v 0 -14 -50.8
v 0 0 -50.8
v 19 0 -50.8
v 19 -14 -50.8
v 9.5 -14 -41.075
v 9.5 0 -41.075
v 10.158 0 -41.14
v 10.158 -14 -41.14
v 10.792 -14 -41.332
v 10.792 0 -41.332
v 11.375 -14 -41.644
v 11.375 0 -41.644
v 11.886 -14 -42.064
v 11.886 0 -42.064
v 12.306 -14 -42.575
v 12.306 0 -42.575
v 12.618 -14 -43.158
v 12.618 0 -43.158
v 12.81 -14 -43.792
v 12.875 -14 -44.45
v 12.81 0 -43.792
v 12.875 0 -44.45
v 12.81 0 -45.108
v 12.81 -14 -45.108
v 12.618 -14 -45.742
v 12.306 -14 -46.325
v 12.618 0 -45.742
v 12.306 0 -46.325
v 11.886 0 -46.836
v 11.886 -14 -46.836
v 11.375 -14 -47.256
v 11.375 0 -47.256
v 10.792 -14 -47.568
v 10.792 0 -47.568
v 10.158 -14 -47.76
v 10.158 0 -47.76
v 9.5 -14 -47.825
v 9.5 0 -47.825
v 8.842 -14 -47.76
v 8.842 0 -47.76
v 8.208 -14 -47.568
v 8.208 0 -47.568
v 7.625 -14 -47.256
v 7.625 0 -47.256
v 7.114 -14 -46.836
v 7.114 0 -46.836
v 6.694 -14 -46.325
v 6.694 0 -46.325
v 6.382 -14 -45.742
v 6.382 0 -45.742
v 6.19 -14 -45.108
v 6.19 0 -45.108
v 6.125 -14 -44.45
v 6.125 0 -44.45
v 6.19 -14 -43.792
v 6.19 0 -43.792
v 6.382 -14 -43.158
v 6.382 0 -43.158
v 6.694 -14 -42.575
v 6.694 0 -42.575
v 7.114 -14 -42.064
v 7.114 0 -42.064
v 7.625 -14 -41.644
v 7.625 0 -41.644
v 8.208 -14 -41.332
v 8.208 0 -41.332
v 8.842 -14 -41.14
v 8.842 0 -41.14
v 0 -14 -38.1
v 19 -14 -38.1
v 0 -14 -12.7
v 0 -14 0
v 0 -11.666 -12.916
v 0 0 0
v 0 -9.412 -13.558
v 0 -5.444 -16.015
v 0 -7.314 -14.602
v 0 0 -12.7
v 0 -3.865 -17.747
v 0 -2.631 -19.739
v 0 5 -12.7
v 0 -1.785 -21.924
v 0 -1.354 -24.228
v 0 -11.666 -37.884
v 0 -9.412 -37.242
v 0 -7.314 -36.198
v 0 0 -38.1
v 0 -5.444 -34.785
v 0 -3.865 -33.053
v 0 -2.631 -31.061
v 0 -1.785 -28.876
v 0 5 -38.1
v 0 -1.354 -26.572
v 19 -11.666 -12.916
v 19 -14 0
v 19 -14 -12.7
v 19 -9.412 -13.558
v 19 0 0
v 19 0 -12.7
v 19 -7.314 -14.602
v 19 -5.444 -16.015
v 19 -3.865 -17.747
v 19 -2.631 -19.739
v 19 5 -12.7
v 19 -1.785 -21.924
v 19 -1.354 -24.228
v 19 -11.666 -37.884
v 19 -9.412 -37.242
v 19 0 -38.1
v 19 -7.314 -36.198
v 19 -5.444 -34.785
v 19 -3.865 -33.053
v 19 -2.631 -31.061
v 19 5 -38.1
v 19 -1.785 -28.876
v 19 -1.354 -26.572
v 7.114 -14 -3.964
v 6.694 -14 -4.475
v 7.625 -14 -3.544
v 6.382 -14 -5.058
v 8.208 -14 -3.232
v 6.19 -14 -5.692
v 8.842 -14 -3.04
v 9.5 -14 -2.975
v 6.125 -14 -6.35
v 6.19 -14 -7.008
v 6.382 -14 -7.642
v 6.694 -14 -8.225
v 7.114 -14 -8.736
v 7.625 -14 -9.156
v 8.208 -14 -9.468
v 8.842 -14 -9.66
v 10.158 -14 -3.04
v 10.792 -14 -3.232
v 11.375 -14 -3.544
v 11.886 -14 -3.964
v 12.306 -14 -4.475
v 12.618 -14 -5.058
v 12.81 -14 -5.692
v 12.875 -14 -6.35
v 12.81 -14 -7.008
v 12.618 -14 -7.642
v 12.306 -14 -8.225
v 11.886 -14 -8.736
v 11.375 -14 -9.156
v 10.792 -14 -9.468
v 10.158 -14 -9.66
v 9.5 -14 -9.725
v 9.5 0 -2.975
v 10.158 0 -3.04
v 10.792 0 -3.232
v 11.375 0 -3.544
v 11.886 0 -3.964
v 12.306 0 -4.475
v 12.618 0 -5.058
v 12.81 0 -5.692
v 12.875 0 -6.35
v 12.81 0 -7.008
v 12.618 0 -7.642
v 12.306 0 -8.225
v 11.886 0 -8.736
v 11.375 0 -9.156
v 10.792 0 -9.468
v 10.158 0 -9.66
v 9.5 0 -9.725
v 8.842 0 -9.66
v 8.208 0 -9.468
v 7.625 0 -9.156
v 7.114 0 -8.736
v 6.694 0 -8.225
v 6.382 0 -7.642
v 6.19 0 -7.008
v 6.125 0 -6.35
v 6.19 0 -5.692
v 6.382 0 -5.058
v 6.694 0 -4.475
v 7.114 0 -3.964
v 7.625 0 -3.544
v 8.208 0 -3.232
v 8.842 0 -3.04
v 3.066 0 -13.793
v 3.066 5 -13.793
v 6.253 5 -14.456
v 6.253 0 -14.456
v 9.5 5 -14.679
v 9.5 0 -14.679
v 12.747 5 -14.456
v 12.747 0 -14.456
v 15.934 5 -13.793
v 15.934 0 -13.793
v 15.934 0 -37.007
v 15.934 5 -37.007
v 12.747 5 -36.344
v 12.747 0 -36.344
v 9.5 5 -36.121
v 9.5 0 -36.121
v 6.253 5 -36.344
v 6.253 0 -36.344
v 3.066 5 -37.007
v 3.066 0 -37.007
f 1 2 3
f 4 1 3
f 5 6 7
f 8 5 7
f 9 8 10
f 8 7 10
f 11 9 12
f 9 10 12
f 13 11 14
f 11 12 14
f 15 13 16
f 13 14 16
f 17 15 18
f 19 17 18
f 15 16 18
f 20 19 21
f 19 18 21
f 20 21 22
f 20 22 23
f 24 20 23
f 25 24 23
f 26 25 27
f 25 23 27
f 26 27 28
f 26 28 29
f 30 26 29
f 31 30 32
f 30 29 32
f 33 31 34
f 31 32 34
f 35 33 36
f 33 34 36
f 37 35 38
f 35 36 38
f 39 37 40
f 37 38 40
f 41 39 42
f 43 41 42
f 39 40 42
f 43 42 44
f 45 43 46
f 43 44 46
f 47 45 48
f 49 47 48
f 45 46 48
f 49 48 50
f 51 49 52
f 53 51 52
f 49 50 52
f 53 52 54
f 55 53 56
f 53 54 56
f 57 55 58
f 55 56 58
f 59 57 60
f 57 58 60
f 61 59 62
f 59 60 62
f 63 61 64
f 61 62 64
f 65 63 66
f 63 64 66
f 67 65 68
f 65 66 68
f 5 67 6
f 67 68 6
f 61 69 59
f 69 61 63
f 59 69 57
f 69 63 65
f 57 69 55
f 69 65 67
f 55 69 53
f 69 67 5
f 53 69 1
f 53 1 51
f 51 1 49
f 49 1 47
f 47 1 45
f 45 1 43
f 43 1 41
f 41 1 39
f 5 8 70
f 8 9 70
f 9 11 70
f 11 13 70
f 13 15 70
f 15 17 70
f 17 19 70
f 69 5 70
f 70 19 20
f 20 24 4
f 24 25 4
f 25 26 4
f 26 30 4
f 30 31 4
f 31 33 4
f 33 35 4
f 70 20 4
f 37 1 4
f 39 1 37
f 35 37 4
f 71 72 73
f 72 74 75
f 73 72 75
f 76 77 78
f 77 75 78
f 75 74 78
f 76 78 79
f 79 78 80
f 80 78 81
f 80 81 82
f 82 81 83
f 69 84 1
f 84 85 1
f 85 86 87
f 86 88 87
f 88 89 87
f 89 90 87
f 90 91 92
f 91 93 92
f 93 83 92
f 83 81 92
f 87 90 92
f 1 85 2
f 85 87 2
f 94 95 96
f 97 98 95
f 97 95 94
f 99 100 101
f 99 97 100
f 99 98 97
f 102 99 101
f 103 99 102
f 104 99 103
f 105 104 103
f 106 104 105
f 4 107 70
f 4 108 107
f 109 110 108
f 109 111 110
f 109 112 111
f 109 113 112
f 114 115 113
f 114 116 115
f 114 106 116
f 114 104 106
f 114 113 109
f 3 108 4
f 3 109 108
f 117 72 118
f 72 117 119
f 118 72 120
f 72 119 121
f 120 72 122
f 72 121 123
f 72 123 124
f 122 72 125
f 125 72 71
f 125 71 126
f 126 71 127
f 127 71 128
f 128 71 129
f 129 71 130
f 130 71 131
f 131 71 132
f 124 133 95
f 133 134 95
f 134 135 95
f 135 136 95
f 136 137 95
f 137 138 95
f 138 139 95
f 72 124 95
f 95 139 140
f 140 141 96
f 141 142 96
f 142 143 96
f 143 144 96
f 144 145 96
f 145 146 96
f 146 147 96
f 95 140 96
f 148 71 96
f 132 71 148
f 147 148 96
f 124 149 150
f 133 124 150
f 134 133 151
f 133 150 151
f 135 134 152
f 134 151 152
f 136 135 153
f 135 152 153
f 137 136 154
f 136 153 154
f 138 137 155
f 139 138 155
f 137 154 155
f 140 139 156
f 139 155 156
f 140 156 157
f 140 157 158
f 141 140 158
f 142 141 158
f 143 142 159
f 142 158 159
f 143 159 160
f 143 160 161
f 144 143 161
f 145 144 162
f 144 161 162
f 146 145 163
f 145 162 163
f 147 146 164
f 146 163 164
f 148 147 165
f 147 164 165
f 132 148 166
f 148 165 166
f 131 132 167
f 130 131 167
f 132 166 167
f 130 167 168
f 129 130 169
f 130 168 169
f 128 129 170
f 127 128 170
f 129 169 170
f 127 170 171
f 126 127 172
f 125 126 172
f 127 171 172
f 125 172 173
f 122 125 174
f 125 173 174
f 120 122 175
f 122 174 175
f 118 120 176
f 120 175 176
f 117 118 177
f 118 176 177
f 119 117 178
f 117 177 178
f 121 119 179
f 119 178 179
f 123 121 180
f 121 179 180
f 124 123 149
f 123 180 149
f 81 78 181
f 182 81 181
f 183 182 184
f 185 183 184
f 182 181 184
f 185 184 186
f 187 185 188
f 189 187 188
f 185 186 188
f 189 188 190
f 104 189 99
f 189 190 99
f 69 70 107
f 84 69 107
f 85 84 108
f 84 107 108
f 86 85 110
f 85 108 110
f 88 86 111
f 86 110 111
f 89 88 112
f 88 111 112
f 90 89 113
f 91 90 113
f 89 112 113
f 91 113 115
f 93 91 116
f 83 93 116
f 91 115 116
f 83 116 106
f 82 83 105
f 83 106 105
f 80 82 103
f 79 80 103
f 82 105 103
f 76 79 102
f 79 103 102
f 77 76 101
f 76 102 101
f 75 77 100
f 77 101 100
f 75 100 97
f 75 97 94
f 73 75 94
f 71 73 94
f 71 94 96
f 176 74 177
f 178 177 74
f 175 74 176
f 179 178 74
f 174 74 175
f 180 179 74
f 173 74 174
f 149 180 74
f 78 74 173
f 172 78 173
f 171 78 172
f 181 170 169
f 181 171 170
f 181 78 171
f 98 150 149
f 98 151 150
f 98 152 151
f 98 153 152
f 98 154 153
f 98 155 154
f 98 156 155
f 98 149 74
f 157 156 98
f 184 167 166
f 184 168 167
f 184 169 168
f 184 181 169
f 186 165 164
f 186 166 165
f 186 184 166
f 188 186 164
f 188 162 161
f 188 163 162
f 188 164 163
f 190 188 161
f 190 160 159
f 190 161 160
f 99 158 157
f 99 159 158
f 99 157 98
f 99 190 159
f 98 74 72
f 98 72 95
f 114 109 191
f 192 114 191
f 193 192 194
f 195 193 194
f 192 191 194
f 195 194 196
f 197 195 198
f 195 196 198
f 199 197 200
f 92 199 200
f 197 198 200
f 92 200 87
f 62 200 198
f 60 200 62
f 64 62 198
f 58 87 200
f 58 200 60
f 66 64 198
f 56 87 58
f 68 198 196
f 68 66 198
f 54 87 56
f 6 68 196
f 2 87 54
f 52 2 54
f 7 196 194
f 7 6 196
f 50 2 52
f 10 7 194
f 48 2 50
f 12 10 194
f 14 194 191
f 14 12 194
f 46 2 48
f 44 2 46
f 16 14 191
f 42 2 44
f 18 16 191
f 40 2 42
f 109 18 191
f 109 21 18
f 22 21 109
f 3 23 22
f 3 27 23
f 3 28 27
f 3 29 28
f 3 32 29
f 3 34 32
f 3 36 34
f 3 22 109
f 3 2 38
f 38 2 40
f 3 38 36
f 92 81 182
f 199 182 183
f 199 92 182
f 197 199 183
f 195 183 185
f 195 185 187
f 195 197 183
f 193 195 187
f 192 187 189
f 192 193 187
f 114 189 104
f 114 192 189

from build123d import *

# Parameters (mm, degrees)
SKETCH1_W           = 19
SKETCH1_H           = 50.8
SKETCH1_R           = 3.375
BOSS_EXTRUDE1_DEPTH = 14
BOSS_EXTRUDE2_DEPTH = 5
SKETCH2_R           = 12.7
CUT_EXTRUDE1_DEPTH  = 57.014640943


with BuildPart() as part:
    # Sketch1 → Boss-Extrude1 (new body)
    with BuildSketch(Plane(origin=(0, 0, 0), x_dir=(1, 0, 0), z_dir=(0, 1, 0))):
        with Locations((9.5, 25.4)):
            Rectangle(SKETCH1_W, SKETCH1_H)
        with Locations((9.5, 6.35)):
            Circle(SKETCH1_R, mode=Mode.SUBTRACT)
        with Locations((9.5, 44.45)):
            Circle(SKETCH1_R, mode=Mode.SUBTRACT)
    extrude(amount=-BOSS_EXTRUDE1_DEPTH)

    # Sketch1<3> → Boss-Extrude2 (add)
    with BuildSketch(Plane(origin=(0, 0, 0), x_dir=(1, 0, 0), z_dir=(0, 1, 0))):
        with BuildLine():
            Line((0, 38.1), (0, 12.7))
            ThreePointArc((0, 12.7), (9.5, 14.679128857), (19, 12.7))
            Line((19, 12.7), (19, 38.1))
            ThreePointArc((19, 38.1), (9.5, 36.120871143), (0, 38.1))
        make_face()
    extrude(amount=BOSS_EXTRUDE2_DEPTH)

    # Sketch2 → Cut-Extrude1 (cut, through all)
    with BuildSketch(Plane(origin=(19, 0, 0), x_dir=(0, 0, -1), z_dir=(1, 0, 0))):
        with Locations((25.4, -14)):
            Circle(SKETCH2_R)
    extrude(amount=-CUT_EXTRUDE1_DEPTH, mode=Mode.SUBTRACT)


solid = part.part
